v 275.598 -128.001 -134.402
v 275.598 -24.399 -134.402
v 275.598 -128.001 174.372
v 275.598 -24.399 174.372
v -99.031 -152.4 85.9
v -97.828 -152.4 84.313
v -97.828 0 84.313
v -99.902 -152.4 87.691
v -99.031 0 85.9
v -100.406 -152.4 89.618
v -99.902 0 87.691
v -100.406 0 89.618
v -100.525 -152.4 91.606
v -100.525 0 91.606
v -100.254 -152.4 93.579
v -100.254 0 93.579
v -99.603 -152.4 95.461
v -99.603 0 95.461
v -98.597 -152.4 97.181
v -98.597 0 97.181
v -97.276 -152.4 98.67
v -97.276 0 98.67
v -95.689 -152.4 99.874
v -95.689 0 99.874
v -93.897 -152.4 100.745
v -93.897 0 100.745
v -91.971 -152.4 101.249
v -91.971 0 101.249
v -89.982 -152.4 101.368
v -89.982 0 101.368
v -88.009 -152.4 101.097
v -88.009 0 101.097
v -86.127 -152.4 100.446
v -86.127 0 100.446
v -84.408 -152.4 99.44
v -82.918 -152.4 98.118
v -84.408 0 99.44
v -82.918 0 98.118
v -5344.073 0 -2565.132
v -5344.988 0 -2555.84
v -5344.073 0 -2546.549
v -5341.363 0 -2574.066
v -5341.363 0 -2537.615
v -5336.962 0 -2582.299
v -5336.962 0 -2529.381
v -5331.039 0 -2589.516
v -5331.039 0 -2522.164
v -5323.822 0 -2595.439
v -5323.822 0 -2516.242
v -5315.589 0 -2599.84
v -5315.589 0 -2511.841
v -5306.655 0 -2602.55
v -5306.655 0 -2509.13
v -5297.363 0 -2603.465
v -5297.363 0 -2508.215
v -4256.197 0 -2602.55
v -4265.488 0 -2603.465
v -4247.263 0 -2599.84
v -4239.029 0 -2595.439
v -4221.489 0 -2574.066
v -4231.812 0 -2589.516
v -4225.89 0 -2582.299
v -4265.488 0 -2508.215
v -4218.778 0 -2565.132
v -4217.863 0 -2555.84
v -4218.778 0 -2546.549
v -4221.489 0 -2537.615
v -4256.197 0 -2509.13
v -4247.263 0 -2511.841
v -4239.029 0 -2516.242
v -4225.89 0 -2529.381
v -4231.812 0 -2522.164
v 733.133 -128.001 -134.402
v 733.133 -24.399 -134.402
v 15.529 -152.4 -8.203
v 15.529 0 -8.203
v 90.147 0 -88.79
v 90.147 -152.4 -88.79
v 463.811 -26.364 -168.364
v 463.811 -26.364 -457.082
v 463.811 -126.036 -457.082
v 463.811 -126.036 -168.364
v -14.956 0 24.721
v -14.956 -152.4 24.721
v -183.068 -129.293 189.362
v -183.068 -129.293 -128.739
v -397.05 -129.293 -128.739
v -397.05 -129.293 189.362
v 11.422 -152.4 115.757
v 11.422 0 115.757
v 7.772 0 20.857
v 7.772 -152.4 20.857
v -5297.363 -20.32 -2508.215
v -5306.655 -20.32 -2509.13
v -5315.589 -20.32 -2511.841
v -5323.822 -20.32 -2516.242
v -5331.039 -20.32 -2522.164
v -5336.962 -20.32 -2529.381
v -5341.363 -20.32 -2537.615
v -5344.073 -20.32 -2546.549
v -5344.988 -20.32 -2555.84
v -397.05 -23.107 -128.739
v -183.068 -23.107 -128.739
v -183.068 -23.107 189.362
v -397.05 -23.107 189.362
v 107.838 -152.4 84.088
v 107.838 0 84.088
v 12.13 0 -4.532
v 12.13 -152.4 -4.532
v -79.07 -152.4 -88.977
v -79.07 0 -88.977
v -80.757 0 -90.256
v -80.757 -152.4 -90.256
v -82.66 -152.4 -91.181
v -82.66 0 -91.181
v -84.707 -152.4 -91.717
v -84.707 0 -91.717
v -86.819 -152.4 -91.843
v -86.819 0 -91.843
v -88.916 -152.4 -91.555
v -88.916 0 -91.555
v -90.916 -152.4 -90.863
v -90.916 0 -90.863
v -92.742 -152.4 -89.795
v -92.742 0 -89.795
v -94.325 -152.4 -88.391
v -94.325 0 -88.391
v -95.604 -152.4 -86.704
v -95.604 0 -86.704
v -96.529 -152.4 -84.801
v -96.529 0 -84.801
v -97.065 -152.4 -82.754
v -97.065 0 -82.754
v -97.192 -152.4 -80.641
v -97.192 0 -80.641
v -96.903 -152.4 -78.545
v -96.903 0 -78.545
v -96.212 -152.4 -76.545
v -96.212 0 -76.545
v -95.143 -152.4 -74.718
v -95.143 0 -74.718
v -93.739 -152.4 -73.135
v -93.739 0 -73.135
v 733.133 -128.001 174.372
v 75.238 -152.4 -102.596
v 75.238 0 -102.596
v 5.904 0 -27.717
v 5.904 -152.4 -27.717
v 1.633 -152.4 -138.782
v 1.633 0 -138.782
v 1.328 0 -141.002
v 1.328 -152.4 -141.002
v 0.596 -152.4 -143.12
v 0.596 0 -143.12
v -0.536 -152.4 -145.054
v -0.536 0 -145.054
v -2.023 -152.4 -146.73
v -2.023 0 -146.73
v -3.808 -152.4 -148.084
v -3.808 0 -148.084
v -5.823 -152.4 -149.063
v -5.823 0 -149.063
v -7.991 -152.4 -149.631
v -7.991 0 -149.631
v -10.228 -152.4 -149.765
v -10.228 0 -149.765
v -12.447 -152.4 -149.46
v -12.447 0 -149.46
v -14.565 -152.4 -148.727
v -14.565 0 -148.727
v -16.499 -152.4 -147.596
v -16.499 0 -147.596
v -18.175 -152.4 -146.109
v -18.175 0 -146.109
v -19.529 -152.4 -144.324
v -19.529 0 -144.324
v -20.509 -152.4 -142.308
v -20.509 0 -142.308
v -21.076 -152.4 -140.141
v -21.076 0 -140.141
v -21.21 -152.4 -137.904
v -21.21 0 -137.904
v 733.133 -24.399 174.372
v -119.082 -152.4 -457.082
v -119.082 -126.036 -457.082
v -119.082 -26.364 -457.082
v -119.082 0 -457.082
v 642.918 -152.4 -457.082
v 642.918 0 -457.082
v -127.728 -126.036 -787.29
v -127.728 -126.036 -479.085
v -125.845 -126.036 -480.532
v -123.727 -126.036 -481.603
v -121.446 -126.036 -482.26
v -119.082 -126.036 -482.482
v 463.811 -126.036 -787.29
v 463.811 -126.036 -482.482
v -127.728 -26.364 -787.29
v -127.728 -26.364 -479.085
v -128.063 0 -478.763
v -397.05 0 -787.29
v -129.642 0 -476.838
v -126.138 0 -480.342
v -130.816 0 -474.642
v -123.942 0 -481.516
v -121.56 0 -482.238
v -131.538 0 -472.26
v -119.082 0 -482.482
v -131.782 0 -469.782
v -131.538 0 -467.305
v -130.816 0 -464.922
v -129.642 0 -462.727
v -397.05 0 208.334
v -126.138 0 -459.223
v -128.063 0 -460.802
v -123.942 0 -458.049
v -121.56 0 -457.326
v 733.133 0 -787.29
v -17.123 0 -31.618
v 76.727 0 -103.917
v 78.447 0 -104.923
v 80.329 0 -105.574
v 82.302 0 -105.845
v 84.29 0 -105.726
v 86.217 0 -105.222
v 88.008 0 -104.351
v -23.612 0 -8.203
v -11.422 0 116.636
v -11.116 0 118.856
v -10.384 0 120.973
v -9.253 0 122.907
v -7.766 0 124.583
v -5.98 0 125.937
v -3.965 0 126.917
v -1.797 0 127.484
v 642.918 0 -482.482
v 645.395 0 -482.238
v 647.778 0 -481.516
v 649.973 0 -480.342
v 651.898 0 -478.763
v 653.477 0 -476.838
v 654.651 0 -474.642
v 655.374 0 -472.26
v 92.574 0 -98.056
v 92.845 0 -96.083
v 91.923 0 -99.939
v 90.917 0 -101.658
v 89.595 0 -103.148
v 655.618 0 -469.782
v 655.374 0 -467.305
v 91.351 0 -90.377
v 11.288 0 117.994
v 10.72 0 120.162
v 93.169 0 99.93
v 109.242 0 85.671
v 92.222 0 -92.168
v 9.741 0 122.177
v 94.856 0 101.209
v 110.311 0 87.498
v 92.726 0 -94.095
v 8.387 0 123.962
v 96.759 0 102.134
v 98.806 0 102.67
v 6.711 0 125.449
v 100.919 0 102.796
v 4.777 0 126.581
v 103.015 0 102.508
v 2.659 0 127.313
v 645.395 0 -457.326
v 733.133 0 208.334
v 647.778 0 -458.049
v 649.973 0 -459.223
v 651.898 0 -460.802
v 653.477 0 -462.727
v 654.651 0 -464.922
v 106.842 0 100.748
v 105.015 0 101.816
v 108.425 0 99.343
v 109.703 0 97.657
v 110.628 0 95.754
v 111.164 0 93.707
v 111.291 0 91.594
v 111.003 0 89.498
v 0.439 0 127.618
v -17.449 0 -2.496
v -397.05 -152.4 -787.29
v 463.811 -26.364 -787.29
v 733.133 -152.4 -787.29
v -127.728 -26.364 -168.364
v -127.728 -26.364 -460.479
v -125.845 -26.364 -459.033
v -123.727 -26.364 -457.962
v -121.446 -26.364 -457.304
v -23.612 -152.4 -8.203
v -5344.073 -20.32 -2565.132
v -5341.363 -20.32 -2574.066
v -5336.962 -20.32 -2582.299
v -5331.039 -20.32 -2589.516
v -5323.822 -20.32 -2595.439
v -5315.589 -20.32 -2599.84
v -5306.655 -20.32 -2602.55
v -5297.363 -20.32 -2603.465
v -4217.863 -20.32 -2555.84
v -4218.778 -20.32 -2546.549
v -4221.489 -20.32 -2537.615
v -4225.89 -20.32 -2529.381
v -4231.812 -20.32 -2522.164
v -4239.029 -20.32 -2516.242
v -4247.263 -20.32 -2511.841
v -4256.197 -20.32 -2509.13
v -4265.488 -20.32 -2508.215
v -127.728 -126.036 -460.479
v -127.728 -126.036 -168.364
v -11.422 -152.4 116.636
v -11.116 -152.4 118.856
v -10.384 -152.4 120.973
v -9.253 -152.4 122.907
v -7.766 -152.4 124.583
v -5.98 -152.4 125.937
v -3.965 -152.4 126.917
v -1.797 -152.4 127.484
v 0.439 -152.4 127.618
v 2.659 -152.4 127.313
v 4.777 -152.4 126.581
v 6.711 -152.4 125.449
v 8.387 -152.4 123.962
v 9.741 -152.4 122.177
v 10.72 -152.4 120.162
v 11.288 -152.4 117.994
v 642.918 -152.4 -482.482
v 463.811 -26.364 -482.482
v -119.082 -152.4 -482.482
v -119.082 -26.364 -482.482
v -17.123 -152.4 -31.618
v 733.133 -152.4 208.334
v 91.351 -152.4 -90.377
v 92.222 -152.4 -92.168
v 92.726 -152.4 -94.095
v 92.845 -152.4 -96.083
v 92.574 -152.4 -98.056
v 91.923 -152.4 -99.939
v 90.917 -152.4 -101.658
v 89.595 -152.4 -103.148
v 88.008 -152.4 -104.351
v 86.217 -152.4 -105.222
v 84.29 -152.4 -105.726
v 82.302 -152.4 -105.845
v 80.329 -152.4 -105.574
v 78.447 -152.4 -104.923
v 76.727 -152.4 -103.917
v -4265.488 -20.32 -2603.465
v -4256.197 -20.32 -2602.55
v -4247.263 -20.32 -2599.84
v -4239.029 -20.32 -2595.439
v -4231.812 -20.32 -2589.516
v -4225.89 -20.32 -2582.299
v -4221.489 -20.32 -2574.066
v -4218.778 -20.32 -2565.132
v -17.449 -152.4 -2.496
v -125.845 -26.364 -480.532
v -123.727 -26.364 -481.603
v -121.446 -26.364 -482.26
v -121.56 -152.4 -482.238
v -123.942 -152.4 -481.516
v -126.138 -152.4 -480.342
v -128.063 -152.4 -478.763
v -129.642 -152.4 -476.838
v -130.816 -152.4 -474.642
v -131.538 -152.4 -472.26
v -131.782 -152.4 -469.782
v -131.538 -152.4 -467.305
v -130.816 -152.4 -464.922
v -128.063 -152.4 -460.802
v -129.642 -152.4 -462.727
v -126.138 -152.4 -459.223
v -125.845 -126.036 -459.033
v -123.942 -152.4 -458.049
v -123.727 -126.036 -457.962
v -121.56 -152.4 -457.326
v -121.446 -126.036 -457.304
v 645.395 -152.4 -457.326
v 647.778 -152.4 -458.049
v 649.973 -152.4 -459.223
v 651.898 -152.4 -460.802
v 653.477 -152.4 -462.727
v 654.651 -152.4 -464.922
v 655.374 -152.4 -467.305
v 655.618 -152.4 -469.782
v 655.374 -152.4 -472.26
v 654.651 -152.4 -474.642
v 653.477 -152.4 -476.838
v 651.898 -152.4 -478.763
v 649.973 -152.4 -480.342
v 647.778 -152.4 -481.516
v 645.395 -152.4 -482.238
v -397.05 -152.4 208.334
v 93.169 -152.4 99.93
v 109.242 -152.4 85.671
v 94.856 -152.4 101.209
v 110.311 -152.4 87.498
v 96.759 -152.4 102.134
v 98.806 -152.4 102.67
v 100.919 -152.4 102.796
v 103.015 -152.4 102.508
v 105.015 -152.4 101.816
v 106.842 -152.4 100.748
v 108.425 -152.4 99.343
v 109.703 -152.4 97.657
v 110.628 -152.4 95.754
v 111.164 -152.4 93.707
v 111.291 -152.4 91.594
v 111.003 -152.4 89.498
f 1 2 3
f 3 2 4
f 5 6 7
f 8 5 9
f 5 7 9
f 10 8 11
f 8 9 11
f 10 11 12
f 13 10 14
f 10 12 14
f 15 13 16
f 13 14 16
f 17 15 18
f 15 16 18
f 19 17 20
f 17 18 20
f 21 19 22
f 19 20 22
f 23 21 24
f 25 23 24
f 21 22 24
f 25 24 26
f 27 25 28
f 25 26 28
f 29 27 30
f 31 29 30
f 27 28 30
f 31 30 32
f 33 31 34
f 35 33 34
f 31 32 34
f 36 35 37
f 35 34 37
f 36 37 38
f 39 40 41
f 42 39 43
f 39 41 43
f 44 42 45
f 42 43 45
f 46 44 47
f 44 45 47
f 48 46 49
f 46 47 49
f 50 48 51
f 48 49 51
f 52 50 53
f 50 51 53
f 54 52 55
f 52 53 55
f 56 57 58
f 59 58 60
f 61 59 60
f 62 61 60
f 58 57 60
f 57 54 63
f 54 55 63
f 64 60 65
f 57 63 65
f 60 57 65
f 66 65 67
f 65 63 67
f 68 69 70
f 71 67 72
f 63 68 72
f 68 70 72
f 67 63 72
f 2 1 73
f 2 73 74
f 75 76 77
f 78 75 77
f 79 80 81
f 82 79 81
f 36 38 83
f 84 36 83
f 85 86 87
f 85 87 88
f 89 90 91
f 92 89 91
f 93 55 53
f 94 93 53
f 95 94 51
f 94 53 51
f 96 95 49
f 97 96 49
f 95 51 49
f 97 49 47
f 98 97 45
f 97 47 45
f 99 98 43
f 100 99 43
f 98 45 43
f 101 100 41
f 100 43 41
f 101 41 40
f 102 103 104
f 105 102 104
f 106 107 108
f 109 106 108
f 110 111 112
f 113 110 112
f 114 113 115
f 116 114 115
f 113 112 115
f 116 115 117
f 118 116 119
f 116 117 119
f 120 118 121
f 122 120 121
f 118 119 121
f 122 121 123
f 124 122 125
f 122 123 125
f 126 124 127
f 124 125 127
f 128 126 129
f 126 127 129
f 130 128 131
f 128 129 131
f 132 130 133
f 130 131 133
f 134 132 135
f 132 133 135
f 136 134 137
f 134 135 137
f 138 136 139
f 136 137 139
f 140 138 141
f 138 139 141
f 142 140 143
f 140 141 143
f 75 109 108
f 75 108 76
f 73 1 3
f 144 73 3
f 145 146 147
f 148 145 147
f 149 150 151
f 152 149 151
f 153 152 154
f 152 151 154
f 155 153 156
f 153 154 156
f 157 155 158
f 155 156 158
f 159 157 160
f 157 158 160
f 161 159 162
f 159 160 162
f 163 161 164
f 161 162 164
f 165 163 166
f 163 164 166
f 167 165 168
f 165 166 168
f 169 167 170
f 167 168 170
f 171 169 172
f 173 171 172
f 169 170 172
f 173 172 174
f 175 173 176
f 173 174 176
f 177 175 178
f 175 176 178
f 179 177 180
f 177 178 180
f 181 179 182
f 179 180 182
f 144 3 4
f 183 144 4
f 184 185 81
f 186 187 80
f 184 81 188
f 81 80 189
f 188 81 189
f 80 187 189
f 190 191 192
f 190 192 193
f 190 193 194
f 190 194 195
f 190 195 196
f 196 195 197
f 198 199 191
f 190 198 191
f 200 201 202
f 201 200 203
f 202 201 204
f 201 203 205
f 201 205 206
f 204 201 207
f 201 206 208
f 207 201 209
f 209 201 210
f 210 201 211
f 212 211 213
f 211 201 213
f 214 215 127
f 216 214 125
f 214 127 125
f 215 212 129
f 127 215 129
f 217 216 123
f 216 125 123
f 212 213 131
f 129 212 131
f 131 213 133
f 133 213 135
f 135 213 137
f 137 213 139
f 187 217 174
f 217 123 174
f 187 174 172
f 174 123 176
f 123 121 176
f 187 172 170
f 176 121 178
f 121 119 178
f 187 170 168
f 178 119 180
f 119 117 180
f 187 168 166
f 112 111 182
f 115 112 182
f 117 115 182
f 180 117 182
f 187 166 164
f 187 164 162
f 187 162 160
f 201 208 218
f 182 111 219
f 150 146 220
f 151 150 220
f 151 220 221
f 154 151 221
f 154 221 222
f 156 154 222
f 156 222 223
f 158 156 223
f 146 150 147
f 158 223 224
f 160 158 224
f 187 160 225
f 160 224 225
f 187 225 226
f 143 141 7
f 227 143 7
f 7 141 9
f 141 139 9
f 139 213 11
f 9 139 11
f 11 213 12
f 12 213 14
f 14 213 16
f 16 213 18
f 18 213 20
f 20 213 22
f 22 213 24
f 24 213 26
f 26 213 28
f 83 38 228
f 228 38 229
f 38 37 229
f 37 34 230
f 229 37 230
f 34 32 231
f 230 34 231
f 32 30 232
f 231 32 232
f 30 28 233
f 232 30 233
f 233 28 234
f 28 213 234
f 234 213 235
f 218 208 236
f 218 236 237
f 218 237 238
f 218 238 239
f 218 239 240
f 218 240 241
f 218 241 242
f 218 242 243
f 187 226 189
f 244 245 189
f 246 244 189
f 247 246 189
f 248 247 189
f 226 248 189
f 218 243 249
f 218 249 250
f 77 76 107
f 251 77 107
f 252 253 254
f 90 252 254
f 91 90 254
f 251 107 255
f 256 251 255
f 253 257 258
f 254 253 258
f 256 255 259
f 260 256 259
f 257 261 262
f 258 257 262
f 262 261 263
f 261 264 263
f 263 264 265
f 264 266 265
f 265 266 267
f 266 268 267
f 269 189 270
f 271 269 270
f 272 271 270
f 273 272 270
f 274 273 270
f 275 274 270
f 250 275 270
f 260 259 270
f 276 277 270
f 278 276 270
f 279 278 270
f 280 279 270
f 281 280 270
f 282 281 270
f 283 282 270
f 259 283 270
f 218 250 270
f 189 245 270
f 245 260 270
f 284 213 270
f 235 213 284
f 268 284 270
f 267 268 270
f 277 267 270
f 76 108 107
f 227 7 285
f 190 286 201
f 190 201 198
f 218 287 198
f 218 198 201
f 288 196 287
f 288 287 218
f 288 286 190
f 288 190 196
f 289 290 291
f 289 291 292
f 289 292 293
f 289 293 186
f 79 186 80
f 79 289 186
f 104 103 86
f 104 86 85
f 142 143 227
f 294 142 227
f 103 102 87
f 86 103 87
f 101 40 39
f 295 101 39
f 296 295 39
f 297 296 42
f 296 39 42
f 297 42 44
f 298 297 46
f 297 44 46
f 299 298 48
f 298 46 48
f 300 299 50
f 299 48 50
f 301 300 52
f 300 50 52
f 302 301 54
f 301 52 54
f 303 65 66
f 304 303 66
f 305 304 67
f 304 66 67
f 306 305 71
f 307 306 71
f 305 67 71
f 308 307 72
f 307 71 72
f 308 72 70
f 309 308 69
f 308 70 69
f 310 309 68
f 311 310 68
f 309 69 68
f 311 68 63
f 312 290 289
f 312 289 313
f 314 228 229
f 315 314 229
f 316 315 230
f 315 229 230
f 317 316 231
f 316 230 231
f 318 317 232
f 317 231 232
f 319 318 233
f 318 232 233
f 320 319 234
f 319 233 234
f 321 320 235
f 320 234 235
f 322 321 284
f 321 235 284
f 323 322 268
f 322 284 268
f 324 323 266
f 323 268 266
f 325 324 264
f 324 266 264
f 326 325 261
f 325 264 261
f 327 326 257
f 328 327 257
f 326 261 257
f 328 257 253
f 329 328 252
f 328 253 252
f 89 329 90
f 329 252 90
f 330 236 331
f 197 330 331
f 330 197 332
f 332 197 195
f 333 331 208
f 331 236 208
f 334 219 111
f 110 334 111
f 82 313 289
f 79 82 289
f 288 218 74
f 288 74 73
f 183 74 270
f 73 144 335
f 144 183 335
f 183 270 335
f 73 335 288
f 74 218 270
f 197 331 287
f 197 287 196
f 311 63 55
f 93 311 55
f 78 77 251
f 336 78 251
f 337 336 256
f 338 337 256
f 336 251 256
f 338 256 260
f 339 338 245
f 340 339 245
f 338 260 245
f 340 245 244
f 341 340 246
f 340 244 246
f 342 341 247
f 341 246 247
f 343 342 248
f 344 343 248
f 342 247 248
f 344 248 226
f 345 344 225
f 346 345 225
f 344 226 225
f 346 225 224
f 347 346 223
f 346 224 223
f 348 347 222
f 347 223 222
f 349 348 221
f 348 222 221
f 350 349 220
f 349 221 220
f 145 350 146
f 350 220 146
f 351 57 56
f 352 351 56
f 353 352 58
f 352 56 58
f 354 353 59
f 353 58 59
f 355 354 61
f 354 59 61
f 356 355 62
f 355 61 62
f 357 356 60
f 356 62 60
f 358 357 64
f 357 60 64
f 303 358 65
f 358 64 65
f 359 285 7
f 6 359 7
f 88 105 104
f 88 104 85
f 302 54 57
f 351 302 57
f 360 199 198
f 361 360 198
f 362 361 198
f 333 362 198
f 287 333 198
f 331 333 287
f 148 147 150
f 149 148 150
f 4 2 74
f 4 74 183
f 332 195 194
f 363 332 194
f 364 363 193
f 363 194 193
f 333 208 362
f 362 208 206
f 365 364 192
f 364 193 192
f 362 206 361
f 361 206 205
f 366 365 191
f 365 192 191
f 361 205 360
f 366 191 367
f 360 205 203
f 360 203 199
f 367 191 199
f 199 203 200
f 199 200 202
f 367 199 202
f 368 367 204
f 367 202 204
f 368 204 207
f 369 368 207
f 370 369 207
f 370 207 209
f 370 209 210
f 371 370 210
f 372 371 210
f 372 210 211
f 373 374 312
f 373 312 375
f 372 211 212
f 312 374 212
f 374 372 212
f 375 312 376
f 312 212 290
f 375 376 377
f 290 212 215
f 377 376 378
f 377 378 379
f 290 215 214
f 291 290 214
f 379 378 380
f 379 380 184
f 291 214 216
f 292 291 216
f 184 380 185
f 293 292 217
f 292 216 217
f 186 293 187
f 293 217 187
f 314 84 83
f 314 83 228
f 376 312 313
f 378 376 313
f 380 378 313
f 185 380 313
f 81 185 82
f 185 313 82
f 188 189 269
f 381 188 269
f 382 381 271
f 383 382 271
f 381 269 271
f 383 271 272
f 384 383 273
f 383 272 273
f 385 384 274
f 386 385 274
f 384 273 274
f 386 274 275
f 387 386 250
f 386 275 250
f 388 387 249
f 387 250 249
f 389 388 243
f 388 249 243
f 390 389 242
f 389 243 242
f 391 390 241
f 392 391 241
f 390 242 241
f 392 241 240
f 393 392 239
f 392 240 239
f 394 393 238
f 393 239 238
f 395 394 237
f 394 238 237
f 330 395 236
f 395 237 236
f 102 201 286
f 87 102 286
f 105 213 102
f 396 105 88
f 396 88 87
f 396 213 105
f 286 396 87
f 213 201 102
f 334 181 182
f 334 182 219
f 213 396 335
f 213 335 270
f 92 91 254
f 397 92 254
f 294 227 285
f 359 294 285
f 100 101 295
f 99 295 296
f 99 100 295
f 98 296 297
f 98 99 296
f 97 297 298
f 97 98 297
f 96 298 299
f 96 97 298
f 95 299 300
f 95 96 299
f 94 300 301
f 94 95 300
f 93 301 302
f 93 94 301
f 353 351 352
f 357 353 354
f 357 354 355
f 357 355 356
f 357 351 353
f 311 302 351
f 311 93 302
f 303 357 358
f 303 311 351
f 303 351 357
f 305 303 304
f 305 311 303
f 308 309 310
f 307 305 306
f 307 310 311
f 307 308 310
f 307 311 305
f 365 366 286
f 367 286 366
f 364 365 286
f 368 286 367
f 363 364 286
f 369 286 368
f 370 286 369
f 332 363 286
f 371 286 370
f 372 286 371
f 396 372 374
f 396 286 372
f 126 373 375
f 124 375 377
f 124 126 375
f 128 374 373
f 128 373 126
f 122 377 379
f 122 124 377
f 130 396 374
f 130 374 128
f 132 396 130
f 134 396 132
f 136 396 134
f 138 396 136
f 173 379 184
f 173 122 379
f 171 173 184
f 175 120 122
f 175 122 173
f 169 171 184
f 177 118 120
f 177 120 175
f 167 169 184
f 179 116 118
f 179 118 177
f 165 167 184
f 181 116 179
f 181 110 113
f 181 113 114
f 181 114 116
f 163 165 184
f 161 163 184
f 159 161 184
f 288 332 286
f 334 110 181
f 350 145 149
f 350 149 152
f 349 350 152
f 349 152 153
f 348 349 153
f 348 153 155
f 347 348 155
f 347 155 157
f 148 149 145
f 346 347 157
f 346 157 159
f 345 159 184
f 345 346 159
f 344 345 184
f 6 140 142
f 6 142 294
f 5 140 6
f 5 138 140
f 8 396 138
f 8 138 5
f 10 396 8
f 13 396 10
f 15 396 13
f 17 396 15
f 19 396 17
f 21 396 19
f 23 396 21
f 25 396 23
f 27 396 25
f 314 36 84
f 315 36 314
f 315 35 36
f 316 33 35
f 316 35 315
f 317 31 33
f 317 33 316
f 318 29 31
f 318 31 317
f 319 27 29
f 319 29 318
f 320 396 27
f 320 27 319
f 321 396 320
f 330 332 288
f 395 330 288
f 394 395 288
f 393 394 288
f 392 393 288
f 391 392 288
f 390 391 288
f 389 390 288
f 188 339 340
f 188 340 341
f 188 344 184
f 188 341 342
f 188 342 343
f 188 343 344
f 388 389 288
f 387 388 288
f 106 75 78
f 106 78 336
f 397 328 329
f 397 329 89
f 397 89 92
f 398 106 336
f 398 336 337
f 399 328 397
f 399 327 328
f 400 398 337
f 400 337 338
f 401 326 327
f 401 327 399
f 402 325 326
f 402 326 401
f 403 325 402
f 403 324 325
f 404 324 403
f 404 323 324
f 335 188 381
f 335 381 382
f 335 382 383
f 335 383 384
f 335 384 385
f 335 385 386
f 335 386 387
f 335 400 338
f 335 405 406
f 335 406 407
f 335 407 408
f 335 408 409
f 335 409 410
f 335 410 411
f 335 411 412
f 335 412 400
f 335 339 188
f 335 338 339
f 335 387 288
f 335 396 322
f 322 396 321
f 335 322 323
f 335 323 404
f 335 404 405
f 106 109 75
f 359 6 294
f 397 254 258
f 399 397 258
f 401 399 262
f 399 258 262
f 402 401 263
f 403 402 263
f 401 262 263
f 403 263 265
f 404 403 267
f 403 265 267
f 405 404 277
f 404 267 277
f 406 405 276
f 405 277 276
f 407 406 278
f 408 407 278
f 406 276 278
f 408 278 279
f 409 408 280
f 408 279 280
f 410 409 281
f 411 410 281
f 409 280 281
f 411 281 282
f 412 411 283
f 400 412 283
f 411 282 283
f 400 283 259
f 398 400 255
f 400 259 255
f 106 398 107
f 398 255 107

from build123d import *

# Parameters (mm, degrees)
F0_W      = 458.6658775806
F0_H      = 376.6978979111
F1_DEPTH  = 152.4
F2_W      = 152.4
F2_H      = 376.6978979111
F2_W_2    = 106.1868537426
F2_H_2    = 318.1016072631
F3_DEPTH  = 213.9821406454
F4_W      = 152.4
F4_H      = 376.6978979111
F4_W_2    = 103.601830101
F4_H_2    = 308.7738156319
F5_DEPTH  = 457.5351234525
F6_W      = 1130.1831416786
F6_H      = 152.4
F6_W_2    = 591.5388166904
F6_H_2    = 99.6719766617
F7_DEPTH  = 618.9263183624
F9_DEPTH  = 152.401
F11_DEPTH = 20.32


with BuildPart() as f1:
    # F0 (on Front) → F1 (new body)
    with BuildSketch(Plane.XZ):
        with Locations((46.2650805712, 19.9848115444)):
            Rectangle(F0_W, F0_H)
        with BuildLine():
            Line((-82.9178265469, 98.1183218425), (-14.9561973089, 24.7206499518))
            Line((-14.9561973089, 24.7206499518), (-11.4215578744, 116.6357050964))
            ThreePointArc((-11.4215578744, 116.6357050964), (0.4392217227, 127.618041248), (11.4215578744, 115.7572616509))
            Line((11.4215578744, 115.7572616509), (7.7721333286, 20.857325011))
            Line((7.7721333286, 20.857325011), (93.1694541833, 99.9298747028))
            ThreePointArc((93.1694541833, 99.9298747028), (108.4246138966, 99.3432299033), (107.8379690971, 84.0880701899))
            Line((107.8379690971, 84.0880701899), (12.1297019485, -4.5317674616))
            Line((12.1297019485, -4.5317674616), (15.5287839348, -8.2027316093))
            Line((15.5287839348, -8.2027316093), (90.1474633082, -88.7899306947))
            ThreePointArc((90.1474633082, -88.7899306947), (89.5953270262, -103.147728072), (75.237529649, -102.59559179))
            Line((75.237529649, -102.59559179), (5.9042024306, -27.716503997))
            Line((5.9042024306, -27.716503997), (1.6331050901, -138.7824712224))
            ThreePointArc((1.6331050901, -138.7824712224), (-10.2276745071, -149.7648073741), (-21.2100106587, -137.9040277769))
            Line((-21.2100106587, -137.9040277769), (-17.1227154648, -31.617666719))
            Line((-17.1227154648, -31.617666719), (-79.0702834402, -88.9772196651))
            ThreePointArc((-79.0702834402, -88.9772196651), (-94.3254431535, -88.3905748655), (-93.738798354, -73.1354151522))
            Line((-93.738798354, -73.1354151522), (-23.6123482512, -8.2027316093))
            Line((-23.6123482512, -8.2027316093), (-17.4487466244, -2.495624044))
            Line((-17.4487466244, -2.495624044), (-97.827760206, 84.3126607472))
            ThreePointArc((-97.827760206, 84.3126607472), (-97.2756239241, 98.6704581245), (-82.9178265469, 98.1183218425))
        make_face(mode=Mode.SUBTRACT)
    extrude(amount=F1_DEPTH)

    # F2 (on face) → F3 (join)
    with BuildSketch(Plane(origin=(-183.0678582191, 0, 0), x_dir=(0, -1, 0), z_dir=(-1, 0, 0))):
        with Locations((76.2, 19.9848115444)):
            Rectangle(F2_W, F2_H)
        with Locations((76.2, 30.3113125265)):
            Rectangle(F2_W_2, F2_H_2, mode=Mode.SUBTRACT)
    extrude(amount=F3_DEPTH)

    # F4 (on face) → F5 (join)
    with BuildSketch(Plane.YZ.offset(275.5980193615)):
        with Locations((-76.2, 19.9848115444)):
            Rectangle(F4_W, F4_H)
        with Locations((-76.2, 19.9848115444)):
            Rectangle(F4_W_2, F4_H_2, mode=Mode.SUBTRACT)
    extrude(amount=F5_DEPTH)

    # F6 (on face) → F7 (join)
    with BuildSketch(Plane(origin=(0, 0, -168.3641374111), x_dir=(1, 0, 0), z_dir=(0, 0, -1))):
        with Locations((168.0415719748, 76.2)):
            Rectangle(F6_W, F6_H)
        with Locations((168.0415719748, 76.2)):
            Rectangle(F6_W_2, F6_H_2, mode=Mode.SUBTRACT)
    extrude(amount=F7_DEPTH)

    # F8 (on face) → F9 (cut, through all)
    with BuildSketch(Plane(origin=(0, 0, 0), x_dir=(-1, 0, 0), z_dir=(0, 1, 0))):
        with BuildLine():
            ThreePointArc((-642.9176926613, -457.0822928429), (-655.6176926613, -469.7822928429), (-642.9176926613, -482.4822928429))
            Line((-642.9176926613, -482.4822928429), (119.0823073387, -482.4822928429))
            ThreePointArc((119.0823073387, -482.4822928429), (131.7823073387, -469.7822928429), (119.0823073387, -457.0822928429))
            Line((119.0823073387, -457.0822928429), (-642.9176926613, -457.0822928429))
        make_face()
    extrude(amount=-F9_DEPTH, mode=Mode.SUBTRACT)


with BuildPart() as f11:
    # F10 (on Front) → F11 (new body)
    with BuildSketch(Plane.XZ):
        with BuildLine():
            Line((-5297.3633460999, -2603.4653430939), (-4265.4883460999, -2603.4653430939))
            ThreePointArc((-4265.4883460999, -2603.4653430939), (-4231.8123856458, -2589.5163035479), (-4217.8633460999, -2555.8403430939))
            ThreePointArc((-4217.8633460999, -2555.8403430939), (-4231.8123856458, -2522.1643826399), (-4265.4883460999, -2508.2153430939))
            Line((-4265.4883460999, -2508.2153430939), (-5297.3633460999, -2508.2153430939))
            ThreePointArc((-5297.3633460999, -2508.2153430939), (-5331.0393065539, -2522.1643826399), (-5344.9883460999, -2555.8403430939))
            ThreePointArc((-5344.9883460999, -2555.8403430939), (-5331.0393065539, -2589.5163035479), (-5297.3633460999, -2603.4653430939))
        make_face()
    extrude(amount=F11_DEPTH)


solid = Compound([f1.part, f11.part])
